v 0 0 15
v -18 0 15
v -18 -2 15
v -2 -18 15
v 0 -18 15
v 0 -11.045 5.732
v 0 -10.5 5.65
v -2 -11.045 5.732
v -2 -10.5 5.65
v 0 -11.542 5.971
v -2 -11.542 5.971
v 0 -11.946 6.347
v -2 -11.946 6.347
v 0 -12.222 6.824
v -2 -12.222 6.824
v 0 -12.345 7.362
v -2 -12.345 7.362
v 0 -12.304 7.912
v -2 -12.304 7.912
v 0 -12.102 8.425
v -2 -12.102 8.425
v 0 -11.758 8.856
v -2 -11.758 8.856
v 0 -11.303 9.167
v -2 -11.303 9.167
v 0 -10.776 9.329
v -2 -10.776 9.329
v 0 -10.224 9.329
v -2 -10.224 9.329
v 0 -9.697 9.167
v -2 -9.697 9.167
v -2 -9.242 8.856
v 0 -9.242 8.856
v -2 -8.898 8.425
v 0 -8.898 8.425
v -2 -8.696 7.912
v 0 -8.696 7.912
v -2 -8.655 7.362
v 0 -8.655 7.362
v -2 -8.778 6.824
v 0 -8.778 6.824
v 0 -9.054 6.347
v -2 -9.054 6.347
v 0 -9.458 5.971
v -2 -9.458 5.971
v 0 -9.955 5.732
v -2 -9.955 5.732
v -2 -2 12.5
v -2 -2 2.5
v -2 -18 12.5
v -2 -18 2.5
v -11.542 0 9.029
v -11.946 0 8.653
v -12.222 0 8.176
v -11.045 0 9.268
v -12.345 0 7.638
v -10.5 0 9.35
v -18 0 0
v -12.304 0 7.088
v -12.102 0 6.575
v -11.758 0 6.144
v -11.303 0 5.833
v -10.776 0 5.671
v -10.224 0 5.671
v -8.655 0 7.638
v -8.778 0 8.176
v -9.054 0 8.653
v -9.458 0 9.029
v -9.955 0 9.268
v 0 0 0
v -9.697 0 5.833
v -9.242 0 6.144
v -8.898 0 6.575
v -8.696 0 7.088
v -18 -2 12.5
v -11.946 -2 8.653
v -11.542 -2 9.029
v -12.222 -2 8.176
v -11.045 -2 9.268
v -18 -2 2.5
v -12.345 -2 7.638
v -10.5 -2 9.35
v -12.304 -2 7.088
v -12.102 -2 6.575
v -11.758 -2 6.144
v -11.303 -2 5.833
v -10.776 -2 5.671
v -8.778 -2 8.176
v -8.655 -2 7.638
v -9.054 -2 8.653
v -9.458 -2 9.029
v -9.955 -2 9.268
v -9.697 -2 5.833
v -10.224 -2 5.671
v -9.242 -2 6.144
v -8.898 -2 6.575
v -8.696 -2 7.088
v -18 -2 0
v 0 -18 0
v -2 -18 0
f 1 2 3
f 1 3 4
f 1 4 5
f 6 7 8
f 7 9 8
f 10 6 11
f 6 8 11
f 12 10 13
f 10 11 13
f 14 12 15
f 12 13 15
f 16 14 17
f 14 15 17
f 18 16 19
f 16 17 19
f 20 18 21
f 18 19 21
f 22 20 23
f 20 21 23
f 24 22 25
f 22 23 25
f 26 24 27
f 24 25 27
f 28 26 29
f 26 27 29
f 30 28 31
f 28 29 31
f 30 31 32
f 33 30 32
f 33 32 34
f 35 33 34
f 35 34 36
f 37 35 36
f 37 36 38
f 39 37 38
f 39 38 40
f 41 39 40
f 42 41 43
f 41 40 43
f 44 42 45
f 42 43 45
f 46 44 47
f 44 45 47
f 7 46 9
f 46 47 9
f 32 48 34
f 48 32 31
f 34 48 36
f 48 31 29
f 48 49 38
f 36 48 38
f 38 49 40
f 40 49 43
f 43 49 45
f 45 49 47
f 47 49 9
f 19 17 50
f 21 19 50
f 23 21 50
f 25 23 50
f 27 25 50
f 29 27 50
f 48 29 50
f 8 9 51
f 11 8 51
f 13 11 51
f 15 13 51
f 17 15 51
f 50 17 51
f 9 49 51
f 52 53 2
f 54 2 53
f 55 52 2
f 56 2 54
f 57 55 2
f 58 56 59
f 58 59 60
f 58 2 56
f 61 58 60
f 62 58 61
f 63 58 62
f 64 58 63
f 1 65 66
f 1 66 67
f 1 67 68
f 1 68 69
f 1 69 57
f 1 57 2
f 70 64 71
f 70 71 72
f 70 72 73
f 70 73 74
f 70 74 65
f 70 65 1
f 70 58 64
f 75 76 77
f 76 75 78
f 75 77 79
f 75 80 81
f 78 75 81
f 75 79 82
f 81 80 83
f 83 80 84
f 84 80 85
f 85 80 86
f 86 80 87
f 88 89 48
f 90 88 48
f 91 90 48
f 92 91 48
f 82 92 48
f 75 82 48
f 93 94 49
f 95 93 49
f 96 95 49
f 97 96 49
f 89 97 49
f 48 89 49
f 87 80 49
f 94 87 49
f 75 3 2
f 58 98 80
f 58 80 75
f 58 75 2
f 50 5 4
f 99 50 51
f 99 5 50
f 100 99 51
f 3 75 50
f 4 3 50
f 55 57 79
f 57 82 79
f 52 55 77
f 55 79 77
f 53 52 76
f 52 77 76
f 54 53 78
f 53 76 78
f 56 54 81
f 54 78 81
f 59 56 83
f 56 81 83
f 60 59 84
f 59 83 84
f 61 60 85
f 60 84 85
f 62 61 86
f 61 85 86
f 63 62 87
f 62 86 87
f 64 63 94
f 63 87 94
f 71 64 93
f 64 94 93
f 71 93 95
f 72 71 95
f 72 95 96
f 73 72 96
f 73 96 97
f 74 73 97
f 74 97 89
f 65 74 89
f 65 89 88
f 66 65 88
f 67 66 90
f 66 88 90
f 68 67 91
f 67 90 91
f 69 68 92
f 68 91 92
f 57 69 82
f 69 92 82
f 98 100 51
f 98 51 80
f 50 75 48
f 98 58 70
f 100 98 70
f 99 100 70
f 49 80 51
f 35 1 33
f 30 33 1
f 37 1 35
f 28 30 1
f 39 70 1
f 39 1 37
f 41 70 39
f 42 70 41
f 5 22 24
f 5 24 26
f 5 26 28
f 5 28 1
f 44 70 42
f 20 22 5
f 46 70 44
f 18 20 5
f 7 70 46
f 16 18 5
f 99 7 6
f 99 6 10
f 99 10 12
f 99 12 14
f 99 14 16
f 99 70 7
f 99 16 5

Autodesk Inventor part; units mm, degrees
ref_plane "YZ Plane" through (0, 0, 0) normal (1, 0, 0) x (0, 1, 0)
ref_plane "XZ Plane" through (0, 0, 0) normal (0, 1, 0) x (-1, 0, 0)
ref_plane "XY Plane" through (0, 0, 0) normal (0, 0, 1) x (1, 0, 0)
sketch "Sketch1" plane through (0, 0, 0) normal (0, 0, 1) x (1, 0, 0)
  line L0 (0, 0) -> (0, -18)
  line L1 (0, -18) -> (-2, -18)
  line L2 (-2, -18) -> (-18, -2)
  line L3 (-18, -2) -> (-18, 0)
  line L4 (-18, 0) -> (0, 0)
  dimension "d0" = 18
  dimension "d1" = 2
extrude "Extrusion1" add sketch "Sketch1" along normal blind 2.5
sketch "Sketch2" plane through (0, 0, 2.5) normal (0, 0, 1) x (1, 0, 0)
  line L0 (0, -18) -> (0, 0) projected
  line L1 (0, 0) -> (-18, 0) projected
  line L2 (-18, 0) -> (-18, -2) projected
  line L3 (-18, -2) -> (-2, -18) projected
  line L4 (-2, -18) -> (0, -18) projected
  line L5 (-18, 0) -> (-18, -2) projected
  line L6 (-18, -2) -> (-2, -2)
  line L7 (-2, -18) -> (0, -18) projected
  line L8 (-2, -2) -> (-2, -18)
extrude "Extrusion2" add sketch "Sketch2" along normal blind 10 contours L4 L8 L6 L2 L1 L0
sketch "Sketch3" plane through (0, 0, 12.5) normal (0, 0, 1) x (1, 0, 0)
  line L0 (-2, -2) -> (-18, -2) projected
  line L1 (-18, -2) -> (-2, -18) projected
  line L2 (-2, -18) -> (-2, -2) projected
  line L3 (0, -18) -> (0, 0) projected
  line L4 (0, 0) -> (-18, 0) projected
  line L5 (-18, 0) -> (-18, -2) projected
  line L6 (-18, -2) -> (-2, -2) projected
  line L7 (-2, -2) -> (-2, -18) projected
  line L8 (-2, -18) -> (0, -18) projected
extrude "Extrusion3" add sketch "Sketch3" along normal blind 2.5
sketch "Sketch4" plane through (-18, 0, 0) normal (0, 1, 0) x (1, 0, 0)
  line L0 (0, 0) -> (18, 0) projected
  line L1 (0, 0) -> (0, -15) projected
  line L2 (18, -15) -> (0, -15) projected
  line L3 (18, 0) -> (18, -15) projected
  point P0 (7.5, -7.5)
  dimension "d8" = 7.5
  dimension "d9" = 7.5
hole "Hole1" at (-10.5, 0, 7.5) direction (0, -1, 0) diameter 3.7 depth 8 tip angle 118
sketch "Sketch5" plane through (0, -18, 0) normal (1, 0, 0) x (0, 0, -1)
  line L0 (0, 18) -> (0, 0) projected
  line L1 (0, 18) -> (-15, 18) projected
  line L2 (-15, 0) -> (-15, 18) projected
  line L3 (0, 0) -> (-15, 0) projected
  point P0 (-7.5, 7.5)
  dimension "d17" = 7.5
  dimension "d18" = 7.5
hole "Hole2" at (0, -10.5, 7.5) direction (-1, 0, 0) diameter 3.7 depth 8 tip angle 118
equation "\"d9\" = d8"
properties part number "Beam_CornerTri" material "ABS Plastic"
